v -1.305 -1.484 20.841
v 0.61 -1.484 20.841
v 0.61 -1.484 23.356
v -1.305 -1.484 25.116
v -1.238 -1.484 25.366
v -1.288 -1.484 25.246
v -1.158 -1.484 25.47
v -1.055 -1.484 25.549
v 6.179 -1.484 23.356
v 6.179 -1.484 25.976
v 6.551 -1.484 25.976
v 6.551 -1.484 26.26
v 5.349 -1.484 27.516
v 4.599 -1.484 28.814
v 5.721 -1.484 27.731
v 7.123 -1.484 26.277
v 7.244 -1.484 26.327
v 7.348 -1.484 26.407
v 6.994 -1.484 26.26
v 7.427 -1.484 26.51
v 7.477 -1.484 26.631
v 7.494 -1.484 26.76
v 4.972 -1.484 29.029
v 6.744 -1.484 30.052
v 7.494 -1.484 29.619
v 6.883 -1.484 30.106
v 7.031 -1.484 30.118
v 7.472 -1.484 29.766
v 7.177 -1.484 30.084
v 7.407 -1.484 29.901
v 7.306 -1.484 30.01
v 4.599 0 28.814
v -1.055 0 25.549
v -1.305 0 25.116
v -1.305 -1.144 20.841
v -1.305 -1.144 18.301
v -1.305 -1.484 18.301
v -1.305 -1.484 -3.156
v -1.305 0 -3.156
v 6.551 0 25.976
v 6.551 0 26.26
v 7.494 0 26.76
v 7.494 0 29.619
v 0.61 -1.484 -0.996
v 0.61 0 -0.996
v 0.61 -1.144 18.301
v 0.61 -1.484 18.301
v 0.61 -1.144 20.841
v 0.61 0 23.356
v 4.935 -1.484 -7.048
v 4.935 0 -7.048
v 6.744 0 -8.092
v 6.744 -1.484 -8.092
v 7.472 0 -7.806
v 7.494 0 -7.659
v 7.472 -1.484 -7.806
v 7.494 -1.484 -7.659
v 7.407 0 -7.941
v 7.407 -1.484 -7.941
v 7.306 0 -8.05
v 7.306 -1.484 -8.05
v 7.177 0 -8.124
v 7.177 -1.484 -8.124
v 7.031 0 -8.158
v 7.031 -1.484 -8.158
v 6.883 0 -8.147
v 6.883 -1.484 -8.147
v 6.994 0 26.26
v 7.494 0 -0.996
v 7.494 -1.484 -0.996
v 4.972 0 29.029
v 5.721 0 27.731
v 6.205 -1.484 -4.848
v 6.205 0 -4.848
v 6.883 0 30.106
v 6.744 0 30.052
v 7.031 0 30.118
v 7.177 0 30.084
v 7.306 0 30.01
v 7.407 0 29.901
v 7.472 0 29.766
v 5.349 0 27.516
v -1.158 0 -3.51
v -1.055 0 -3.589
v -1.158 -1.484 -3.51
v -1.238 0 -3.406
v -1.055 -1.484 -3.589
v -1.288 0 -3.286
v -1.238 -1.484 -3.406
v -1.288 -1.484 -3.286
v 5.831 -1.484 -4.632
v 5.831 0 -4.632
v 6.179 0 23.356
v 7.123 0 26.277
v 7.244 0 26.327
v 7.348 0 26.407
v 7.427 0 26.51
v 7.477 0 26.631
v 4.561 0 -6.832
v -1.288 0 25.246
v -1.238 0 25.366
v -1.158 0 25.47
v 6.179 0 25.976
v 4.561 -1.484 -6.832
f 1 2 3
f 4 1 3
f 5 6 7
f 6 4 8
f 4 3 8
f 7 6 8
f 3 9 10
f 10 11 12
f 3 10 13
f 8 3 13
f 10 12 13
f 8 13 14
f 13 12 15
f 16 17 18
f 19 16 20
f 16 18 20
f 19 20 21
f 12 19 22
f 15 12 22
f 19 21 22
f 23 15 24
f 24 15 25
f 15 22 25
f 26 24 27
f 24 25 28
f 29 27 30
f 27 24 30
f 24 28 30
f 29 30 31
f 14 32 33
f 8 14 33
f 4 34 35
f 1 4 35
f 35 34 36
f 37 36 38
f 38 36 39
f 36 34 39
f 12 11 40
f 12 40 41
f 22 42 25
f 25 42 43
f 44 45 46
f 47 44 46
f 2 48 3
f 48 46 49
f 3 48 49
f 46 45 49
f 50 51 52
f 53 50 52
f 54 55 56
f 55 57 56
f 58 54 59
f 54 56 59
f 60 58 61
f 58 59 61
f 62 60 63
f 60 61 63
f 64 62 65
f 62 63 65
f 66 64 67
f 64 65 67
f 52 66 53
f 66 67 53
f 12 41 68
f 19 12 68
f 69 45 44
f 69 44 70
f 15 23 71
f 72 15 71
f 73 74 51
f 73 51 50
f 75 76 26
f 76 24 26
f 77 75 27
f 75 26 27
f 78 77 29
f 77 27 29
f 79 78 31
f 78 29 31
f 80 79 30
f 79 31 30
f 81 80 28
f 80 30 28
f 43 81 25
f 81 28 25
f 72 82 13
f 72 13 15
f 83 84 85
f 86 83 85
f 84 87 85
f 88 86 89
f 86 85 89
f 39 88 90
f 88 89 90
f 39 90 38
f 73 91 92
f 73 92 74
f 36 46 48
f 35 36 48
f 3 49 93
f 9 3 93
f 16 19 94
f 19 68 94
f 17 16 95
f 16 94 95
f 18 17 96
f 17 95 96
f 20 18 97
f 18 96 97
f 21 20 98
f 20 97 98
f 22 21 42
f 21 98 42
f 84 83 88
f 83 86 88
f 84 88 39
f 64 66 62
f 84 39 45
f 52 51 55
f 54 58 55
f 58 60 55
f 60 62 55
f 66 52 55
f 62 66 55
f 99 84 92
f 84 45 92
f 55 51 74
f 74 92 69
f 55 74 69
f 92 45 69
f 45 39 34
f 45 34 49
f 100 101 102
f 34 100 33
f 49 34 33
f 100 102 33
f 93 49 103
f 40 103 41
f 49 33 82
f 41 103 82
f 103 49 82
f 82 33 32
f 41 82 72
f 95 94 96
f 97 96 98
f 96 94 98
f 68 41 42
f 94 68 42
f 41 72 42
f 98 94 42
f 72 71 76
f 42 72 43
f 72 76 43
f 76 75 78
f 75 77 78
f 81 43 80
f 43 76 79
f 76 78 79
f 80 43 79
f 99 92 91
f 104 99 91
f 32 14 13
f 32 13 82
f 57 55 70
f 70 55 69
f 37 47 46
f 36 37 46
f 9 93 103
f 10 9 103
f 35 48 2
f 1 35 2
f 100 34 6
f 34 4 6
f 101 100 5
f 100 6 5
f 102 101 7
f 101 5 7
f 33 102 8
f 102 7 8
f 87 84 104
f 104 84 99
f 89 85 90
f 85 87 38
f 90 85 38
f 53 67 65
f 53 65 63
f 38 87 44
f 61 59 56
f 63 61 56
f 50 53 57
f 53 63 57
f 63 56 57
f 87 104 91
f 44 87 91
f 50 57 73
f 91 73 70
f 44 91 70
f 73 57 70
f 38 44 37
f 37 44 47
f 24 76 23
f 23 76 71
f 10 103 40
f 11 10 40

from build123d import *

# Parameters (mm, degrees)
F1_DEPTH  = 16.1798
F2_W      = 14.6956490017
F2_H      = 39.0100460752
F3_DEPTH  = 25.4
F4_W      = 7.289106492
F4_H      = 24.3518359493
F5_DEPTH  = 6.0198
F6_W      = 0.4318
F6_H      = 1.4841509983
F7_DEPTH  = 2.54
F8_W      = 1.707770396
F8_H      = 26.8365105148
F9_DEPTH  = 5.8674
F10_W     = 4.3080397882
F10_H     = 25.773898873
F11_DEPTH = 8.382
F12_W     = 0.4299804568
F12_H     = 1.4841509983
F13_DEPTH = 1.4986
F14_W     = 0.3396534594
F14_H     = 2.54
F14_W_2   = 0.0413465406
F15_DEPTH = 25.4
F16_R     = 0.5


with BuildPart() as f1:
    # F0 (on Front) → F1 (new body)
    with BuildSketch(Plane.XZ):
        Polygon((7.4940245816, -8.5250653475), (7.4940245816, 30.4849807278), (-1.3047935208, 25.4049807278), (-1.3047935208, -3.4450653475), align=None)
    extrude(amount=F1_DEPTH)

    # F2 (on face) → F3 (cut)
    with BuildSketch(Plane.YZ.offset(7.4940245816)):
        with Locations((-8.8319754991, 10.9799576901)):
            Rectangle(F2_W, F2_H)
    extrude(amount=-F3_DEPTH, mode=Mode.SUBTRACT)

    # F4 (on face) → F5 (cut)
    with BuildSketch(Plane.XZ):
        with Locations((4.2547506746, 11.1802831525)):
            Rectangle(F4_W, F4_H)
    extrude(amount=F5_DEPTH, mode=Mode.SUBTRACT)

    # F6 (on face) → F7 (cut)
    with BuildSketch(Plane(origin=(-1.8179554345, 0, -3.1487911785), x_dir=(0.8660254038, 0, -0.5), z_dir=(-0.5, 0, -0.8660254038))):
        with Locations((7.5819472408, 0.7420754991)):
            Rectangle(F6_W, F6_H)
    extrude(amount=-F7_DEPTH, mode=Mode.SUBTRACT)

    # F8 (on Front) → F9 (cut)
    with BuildSketch(Plane.XZ):
        with Locations((7.0332919713, 12.55759981)):
            Rectangle(F8_W, F8_H)
    extrude(amount=F9_DEPTH, mode=Mode.SUBTRACT)

    # F10 (on Front) → F11 (cut)
    with BuildSketch(Plane.XZ):
        with Locations((8.7046686094, 13.3732402755)):
            Rectangle(F10_W, F10_H)
    extrude(amount=F11_DEPTH, mode=Mode.SUBTRACT)

    # F12 (on face) → F13 (cut)
    with BuildSketch(Plane(origin=(-11.3268777267, 0, 19.6187277137), x_dir=(0.8660254038, 0, 0.5), z_dir=(-0.5, 0, 0.8660254038))):
        with Locations((18.6048597097, -0.7420754991)):
            Rectangle(F12_W, F12_H)
    extrude(amount=-F13_DEPTH, mode=Mode.SUBTRACT)

    # F14 (on face) → F15 (cut)
    with BuildSketch(Plane.YZ.offset(0.6101974286)):
        with Locations((-1.3143242686, 19.5710362089)):
            Rectangle(F14_W, F14_H)
        with Locations((-1.5048242686, 19.5710362089)):
            Rectangle(F14_W_2, F14_H)
    extrude(amount=-F15_DEPTH, mode=Mode.SUBTRACT)

    # F16
    f16_edges = [f1.edges().sort_by_distance(p)[0] for p in [
        (7.494025, -0.742075, 30.484981),
        (7.494025, -0.742075, -8.525065),
        (-1.304794, -0.742075, -3.445065),
        (-1.304794, -0.742075, 25.404981),
        (7.494025, -0.742075, 26.26019),
    ]]
    fillet(f16_edges, radius=F16_R)


solid = f1.part
